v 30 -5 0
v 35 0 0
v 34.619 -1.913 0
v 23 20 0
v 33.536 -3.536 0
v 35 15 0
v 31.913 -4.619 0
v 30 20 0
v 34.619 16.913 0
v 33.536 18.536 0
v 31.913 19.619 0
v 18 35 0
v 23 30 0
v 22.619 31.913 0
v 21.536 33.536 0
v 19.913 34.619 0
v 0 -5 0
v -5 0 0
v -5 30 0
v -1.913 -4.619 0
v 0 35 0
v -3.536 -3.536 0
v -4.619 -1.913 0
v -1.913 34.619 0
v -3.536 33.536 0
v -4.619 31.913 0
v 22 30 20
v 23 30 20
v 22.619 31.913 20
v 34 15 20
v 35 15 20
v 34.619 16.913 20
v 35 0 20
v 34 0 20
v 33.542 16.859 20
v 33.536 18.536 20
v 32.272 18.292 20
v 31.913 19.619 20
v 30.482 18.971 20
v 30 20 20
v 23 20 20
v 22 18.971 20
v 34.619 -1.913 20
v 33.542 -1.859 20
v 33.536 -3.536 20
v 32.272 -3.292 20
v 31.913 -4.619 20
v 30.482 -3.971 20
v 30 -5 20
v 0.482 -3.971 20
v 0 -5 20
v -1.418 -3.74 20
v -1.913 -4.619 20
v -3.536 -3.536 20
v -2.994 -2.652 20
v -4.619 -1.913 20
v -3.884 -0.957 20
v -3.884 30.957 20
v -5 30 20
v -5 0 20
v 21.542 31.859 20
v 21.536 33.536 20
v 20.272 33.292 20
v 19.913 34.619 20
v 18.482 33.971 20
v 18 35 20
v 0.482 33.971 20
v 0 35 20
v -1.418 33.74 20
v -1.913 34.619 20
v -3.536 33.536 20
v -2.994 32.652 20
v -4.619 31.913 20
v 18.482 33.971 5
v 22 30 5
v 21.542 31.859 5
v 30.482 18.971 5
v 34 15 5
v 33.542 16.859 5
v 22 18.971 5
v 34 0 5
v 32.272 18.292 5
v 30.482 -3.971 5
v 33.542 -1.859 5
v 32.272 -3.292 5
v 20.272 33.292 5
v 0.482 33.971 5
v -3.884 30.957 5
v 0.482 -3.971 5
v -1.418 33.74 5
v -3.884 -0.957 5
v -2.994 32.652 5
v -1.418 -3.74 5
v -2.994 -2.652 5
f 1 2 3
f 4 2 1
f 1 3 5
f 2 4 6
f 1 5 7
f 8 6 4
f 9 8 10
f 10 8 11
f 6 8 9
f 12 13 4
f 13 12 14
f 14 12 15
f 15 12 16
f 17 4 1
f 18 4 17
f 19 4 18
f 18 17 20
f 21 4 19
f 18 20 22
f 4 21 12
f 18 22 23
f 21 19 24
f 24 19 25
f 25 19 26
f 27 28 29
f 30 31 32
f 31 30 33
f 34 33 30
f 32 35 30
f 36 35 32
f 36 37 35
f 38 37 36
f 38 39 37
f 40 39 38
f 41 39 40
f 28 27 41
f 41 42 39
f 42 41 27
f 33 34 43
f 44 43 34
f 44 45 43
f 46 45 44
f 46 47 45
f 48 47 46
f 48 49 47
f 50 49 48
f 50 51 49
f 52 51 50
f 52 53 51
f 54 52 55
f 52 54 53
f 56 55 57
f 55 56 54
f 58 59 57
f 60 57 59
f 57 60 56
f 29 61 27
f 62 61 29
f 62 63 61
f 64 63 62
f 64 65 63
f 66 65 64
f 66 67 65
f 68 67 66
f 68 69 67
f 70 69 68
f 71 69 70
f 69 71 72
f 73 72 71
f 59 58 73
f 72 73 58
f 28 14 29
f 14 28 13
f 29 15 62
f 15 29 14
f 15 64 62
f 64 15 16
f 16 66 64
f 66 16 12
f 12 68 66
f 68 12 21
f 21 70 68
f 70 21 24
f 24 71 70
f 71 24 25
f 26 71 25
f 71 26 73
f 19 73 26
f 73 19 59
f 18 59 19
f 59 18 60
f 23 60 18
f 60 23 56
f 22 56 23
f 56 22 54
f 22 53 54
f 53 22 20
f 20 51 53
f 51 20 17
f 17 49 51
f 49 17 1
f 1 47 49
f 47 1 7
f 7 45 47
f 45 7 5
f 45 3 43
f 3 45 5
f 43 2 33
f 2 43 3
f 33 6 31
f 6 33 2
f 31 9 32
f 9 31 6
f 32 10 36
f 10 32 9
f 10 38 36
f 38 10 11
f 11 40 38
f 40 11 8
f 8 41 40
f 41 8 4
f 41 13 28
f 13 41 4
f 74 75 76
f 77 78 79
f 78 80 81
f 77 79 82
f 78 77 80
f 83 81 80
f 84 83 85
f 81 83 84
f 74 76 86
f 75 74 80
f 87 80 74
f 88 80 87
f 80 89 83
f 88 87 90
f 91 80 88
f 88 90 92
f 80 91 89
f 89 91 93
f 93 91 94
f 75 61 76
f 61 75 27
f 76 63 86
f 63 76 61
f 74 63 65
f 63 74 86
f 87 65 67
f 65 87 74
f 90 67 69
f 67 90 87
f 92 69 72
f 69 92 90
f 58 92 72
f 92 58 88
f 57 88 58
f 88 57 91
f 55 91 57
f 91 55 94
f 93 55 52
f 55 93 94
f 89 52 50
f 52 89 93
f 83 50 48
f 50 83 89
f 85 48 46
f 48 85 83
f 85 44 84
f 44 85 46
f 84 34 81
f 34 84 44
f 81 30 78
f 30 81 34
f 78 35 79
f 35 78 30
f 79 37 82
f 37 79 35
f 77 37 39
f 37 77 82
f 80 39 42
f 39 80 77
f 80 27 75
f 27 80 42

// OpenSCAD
data=[[0,0],[0,30],[18,30],
      [18,15],[30,15],[30,0]];

r=5;
h=5;
difference(){
    linear_extrude(20){
        shape(r);
    };
    translate([0,0,h]){
        linear_extrude(20){
            shape(r-1);
        };
    };
};

module shape(r){
    minkowski(){
        polygon(data);
        circle(r);
    };
};
